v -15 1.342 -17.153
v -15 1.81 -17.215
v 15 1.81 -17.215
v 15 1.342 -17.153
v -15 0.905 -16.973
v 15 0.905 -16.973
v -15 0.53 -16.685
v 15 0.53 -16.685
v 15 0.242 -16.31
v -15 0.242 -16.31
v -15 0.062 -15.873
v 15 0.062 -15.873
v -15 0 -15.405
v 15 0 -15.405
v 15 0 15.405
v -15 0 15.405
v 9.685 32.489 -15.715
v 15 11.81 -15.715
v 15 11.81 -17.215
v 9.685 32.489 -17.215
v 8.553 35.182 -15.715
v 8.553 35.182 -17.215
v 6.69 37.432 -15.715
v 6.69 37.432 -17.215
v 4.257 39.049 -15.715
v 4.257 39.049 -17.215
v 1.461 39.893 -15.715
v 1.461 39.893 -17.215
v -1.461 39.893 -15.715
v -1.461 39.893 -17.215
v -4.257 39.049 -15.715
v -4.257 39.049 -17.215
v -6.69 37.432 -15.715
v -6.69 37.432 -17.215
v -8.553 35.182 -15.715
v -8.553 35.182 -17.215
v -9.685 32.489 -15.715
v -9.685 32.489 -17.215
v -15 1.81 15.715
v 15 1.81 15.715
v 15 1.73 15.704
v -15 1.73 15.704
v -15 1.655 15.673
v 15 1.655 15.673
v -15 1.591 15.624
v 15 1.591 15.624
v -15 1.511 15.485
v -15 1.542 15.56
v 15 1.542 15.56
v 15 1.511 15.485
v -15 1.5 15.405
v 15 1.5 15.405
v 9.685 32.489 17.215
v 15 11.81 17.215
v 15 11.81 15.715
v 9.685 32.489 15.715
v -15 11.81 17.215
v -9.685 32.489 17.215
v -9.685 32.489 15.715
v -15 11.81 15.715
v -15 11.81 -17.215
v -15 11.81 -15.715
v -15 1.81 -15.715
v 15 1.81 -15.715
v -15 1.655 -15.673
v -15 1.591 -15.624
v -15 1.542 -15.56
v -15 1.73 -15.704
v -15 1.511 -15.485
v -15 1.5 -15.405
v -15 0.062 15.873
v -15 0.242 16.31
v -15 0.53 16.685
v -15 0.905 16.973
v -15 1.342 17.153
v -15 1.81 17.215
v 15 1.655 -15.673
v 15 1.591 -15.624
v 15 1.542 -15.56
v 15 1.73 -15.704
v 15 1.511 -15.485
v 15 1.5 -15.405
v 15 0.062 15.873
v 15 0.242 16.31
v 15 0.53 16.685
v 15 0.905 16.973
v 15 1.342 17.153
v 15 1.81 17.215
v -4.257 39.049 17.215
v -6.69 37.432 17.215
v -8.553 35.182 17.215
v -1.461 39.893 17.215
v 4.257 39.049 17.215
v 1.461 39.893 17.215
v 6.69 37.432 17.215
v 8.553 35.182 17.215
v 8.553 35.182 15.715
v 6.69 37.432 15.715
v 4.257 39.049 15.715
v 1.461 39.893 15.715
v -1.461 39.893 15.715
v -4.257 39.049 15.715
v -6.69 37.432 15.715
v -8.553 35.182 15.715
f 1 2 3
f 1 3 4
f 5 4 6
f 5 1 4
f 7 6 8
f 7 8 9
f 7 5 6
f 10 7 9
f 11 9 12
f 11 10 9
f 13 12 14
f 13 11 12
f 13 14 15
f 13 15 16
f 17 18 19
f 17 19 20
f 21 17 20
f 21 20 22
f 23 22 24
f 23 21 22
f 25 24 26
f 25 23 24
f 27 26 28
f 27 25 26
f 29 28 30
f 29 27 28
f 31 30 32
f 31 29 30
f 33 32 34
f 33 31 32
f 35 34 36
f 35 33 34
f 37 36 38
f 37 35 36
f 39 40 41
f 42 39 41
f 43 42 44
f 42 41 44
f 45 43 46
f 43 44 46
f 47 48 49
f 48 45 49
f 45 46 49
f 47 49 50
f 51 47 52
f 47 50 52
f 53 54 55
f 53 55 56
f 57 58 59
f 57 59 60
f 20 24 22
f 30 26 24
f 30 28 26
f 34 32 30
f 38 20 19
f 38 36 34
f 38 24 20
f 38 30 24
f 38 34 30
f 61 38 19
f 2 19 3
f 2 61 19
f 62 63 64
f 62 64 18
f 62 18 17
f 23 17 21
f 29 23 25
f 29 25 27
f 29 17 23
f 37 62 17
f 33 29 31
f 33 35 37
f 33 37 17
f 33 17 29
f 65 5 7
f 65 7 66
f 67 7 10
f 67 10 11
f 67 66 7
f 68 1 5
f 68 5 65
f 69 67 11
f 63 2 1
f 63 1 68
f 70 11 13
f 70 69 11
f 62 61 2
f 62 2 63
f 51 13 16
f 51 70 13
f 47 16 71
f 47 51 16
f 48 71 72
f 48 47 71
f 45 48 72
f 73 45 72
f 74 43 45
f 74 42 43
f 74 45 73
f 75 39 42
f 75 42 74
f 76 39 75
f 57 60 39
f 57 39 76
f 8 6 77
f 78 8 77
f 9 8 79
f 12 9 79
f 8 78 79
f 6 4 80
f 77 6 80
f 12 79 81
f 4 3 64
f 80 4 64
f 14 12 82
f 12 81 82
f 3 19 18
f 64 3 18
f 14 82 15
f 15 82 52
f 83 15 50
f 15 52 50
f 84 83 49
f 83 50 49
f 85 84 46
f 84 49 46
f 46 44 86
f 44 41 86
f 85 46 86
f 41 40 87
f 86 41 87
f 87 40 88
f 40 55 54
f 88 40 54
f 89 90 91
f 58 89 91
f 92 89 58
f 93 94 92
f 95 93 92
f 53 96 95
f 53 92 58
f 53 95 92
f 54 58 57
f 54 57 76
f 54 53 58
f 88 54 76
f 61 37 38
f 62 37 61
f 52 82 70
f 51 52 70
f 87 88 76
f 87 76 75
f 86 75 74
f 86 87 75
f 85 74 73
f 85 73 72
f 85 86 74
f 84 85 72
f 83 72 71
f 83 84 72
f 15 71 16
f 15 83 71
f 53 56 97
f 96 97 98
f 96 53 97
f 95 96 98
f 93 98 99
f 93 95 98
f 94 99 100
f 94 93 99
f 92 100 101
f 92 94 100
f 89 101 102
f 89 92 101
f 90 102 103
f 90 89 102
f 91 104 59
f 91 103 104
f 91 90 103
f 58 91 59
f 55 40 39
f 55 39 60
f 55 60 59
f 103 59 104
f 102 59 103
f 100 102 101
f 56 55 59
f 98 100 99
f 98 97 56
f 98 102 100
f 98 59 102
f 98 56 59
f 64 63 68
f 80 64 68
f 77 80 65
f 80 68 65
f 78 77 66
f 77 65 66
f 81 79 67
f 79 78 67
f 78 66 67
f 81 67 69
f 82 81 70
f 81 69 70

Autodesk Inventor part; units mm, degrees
ref_plane "YZ Plane" through (0, 0, 0) normal (1, 0, 0) x (0, 1, 0)
ref_plane "XZ Plane" through (0, 0, 0) normal (0, 1, 0) x (-1, 0, 0)
ref_plane "XY Plane" through (0, 0, 0) normal (0, 0, 1) x (1, 0, 0)
sketch "Sketch1" plane through (0, 0, 0) normal (0, 1, 0) x (-1, 0, 0)
  line L0 (15, -15.715) -> (-15, -15.715)
  line L1 (-15, -15.715) -> (-15, 15.715)
  line L2 (-15, 15.715) -> (15, 15.715)
  line L3 (15, 15.715) -> (15, -15.715)
  point P0 (0, 0)
  dimension "d0" = 30
  dimension "d1" = 15
  dimension "d2" = 31.43
  dimension "d3" = 15.715
extrude "Plate1" add sketch "Sketch1" along normal blind 1.5
sketch "Sketch2" plane through (15, 0, 17.215) normal (0, 0, -1) x (-1, 0, 0)
  line L0 (30, 0) -> (0, 0)
  line L1 (0, 0) -> (0, 40)
  line L2 (0, 40) -> (30, 40)
  line L3 (30, 40) -> (30, 0)
edge flange "Flange1" height 40 angle 90 thickness 1.5 bend radius 0.31 thickness toward (0, 0, -1) relief tear relief width 1.5 relief depth 0.75 edges at (0, 1.5, 15.715) wall of the first edge with corners at (-15, 0, 17.215) (15, 0, 17.215) (15, 40, 17.215) (-15, 40, 17.215)
bend "Bend1"
corner "Corner1"
sketch "Sketch3" plane through (-15, 0, -17.215) normal (0, 0, 1) x (1, 0, 0)
  line L0 (30, 0) -> (0, 0)
  line L1 (0, 0) -> (0, 40)
  line L2 (0, 40) -> (30, 40)
  line L3 (30, 40) -> (30, 0)
edge flange "Flange2" height 40 angle 90 thickness 1.5 bend radius 0.31 thickness toward (0, 0, 1) relief tear relief width 1.5 relief depth 0.75 edges at (0, 1.5, -15.715) wall of the first edge with corners at (15, 0, -17.215) (-15, 0, -17.215) (-15, 40, -17.215) (15, 40, -17.215)
bend "Bend2"
corner "Corner2"
sketch "Sketch4" plane through (-15, 40, 17.215) normal (0, 0, 1) x (1, 0, 0)
  circle A0 centre (15, -10) radius 10
  line L0 (0, 0) -> (30, 0) projected
  line L1 (30, 0) -> (30, -38.19) projected
  line L2 (5.3148, -7.5108) -> (0, -28.19)
  line L3 (0, -28.19) -> (0, -38.19)
  line L4 (0, -38.19) -> (30, -38.19)
  line L5 (30, -38.19) -> (30, -28.19)
  line L6 (30, -28.19) -> (24.6852, -7.5108)
  line L7 (0, -38.19) -> (30, -38.19) projected
  line L8 (0, -38.19) -> (0, 0) projected
  point P0 (15, -40)
  point P1 (0, -28.19)
  point P2 (15, 0)
  point P3 (30, -28.19)
  dimension "d25" = 10
  dimension "d26" = 15
  dimension "d27" = 20
  dimension "d29" = 30
  dimension "d30" = 0
  dimension "d31" = 10
  dimension "d32" = 10
  dimension "d33" = 0
extrude "Extrusion1" cut sketch "Sketch4" against normal blind 50 contours A0 L0 L1 L6 | L2 L8 L0 A0
equation "\"d4\" = Thickness"
equation "\"d5\" = BendReliefWidth"
equation "\"d6\" = BendReliefDepth"
equation "\"d7\" = MinimumRemnant"
equation "\"d8\" = TransitionRadius"
equation "\"d11\" = BendRadius"
equation "\"d12\" = CornerReliefSize"
equation "\"d13\" = GapSize"
equation "\"d14\" = JacobiRadiusSize"
equation "\"d15\" = BendReliefWidth"
equation "\"d16\" = BendReliefDepth"
equation "\"d17\" = MinimumRemnant"
equation "\"d18\" = TransitionRadius"
equation "\"d21\" = BendRadius"
equation "\"d22\" = CornerReliefSize"
equation "\"d23\" = GapSize"
equation "\"d24\" = JacobiRadiusSize"
equation "\"BendReliefWidth\" = Thickness"
equation "\"BendReliefDepth\" = 0.5 * Thickness"
equation "\"CornerReliefSize\" = 4 * Thickness"
equation "\"MinimumRemnant\" = 2 * Thickness"
equation "\"TransitionRadius\" = BendRadius"
equation "\"JacobiRadiusSize\" = BendRadius"
equation "\"GapSize\" = Thickness"
equation "\"Thickness\" = 1.5"
equation "\"BendRadius\" = 0.31"
properties part number "axis_12_bottom_frame(top)" material "Aluminum 6061-AHC"
